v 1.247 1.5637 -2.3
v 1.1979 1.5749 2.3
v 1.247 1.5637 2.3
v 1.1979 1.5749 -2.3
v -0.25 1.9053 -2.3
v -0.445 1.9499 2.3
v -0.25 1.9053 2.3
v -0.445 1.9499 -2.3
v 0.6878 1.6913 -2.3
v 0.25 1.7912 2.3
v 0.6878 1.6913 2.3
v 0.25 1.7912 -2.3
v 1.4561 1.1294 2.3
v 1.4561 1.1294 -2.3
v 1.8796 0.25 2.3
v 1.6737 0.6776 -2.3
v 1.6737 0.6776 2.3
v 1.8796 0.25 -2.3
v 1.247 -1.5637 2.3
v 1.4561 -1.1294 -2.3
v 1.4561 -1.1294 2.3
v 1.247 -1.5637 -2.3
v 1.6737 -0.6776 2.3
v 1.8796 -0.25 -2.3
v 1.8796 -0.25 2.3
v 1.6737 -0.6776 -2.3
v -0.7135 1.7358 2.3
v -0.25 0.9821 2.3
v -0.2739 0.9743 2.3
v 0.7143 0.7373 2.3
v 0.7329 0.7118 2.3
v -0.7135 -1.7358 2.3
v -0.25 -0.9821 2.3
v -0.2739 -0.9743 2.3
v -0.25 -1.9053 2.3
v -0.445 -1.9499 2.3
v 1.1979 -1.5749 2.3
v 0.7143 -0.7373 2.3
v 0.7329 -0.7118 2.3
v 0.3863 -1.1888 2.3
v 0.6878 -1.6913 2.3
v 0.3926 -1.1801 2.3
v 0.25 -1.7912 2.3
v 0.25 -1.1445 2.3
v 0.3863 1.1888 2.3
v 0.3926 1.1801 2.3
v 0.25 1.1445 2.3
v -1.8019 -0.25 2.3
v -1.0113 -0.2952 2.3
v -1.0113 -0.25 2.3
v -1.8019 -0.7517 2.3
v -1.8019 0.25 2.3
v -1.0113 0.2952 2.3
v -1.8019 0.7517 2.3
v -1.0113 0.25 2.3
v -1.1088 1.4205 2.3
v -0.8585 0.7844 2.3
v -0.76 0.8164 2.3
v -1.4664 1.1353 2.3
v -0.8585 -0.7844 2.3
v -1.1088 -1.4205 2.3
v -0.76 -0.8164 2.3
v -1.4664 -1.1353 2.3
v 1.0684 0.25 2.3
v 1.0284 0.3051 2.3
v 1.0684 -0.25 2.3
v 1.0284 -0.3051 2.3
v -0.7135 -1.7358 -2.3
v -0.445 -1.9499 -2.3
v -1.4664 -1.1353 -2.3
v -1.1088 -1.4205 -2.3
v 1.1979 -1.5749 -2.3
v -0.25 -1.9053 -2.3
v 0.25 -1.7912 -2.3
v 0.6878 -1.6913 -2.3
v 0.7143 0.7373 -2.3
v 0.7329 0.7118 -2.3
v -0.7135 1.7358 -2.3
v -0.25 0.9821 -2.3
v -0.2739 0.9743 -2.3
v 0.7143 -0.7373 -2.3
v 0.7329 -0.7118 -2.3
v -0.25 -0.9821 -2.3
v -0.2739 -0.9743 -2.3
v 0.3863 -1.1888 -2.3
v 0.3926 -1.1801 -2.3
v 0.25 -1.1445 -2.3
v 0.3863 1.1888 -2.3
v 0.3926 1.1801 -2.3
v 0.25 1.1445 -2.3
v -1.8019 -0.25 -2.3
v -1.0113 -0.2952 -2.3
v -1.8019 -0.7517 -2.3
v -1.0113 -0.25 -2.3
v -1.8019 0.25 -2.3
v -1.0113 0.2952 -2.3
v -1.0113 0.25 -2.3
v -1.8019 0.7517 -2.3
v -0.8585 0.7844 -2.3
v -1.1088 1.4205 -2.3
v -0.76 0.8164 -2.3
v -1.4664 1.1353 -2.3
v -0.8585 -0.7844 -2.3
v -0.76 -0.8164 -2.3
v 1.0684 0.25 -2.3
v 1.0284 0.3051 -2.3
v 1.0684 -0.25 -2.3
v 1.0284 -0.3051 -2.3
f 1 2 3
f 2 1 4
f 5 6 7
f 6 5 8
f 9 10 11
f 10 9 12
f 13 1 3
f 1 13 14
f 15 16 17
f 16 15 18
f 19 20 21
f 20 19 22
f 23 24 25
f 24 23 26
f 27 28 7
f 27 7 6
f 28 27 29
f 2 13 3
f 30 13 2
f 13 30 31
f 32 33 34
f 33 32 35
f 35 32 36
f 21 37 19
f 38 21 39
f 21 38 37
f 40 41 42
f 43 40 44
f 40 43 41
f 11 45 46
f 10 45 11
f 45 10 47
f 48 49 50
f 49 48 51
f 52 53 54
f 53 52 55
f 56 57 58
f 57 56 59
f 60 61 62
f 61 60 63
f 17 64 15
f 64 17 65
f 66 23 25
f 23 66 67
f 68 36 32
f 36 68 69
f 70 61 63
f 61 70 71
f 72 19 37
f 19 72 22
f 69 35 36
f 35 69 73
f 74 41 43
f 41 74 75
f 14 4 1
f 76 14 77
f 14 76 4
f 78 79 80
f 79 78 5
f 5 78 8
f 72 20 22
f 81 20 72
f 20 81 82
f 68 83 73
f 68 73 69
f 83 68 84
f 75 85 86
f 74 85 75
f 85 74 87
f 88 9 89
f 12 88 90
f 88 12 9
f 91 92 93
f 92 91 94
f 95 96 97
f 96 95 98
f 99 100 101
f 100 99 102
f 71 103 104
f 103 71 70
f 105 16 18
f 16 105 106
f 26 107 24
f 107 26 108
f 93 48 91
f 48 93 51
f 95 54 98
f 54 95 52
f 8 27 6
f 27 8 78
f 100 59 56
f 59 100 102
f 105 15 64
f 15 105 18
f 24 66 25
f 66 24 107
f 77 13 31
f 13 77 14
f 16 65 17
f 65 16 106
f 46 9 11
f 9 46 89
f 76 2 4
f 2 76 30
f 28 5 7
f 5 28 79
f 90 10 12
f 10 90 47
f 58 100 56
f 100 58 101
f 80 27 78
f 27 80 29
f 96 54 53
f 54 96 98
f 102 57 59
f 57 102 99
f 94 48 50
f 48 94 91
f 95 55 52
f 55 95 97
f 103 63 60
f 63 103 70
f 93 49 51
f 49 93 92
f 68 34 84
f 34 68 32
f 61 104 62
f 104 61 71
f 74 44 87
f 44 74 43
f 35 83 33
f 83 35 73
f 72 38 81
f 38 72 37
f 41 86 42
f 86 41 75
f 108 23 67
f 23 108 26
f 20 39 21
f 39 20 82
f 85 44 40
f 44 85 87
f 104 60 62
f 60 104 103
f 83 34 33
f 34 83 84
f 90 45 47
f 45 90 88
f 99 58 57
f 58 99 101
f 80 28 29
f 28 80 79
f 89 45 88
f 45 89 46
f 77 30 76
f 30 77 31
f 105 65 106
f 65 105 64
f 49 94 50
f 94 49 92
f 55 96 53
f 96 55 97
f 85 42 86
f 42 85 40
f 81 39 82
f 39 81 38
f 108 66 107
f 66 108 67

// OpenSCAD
// Parameters
outer_diameter_mm = 4.0; //[2.0:8.0:0.1]
length_mm = 4.6; //[2.3:9.2:0.1]
screw_nominal_diameter_mm = 2.5; //[1.2:5.0:0.1]
internal_hole_diameter_mm = 2.5; //[1.2:4.0:0.05]
internal_thread_pitch_mm = 0.45; //[0.2:1.0:0.01]
top_chamfer_height_mm = 0.4; //[0.2:1.0:0.05]
bottom_chamfer_height_mm = 0.4; //[0.2:1.0:0.05]
knurl_depth_mm = 0.25; //[0.1:0.6:0.01]
knurl_pitch_mm = 0.8; //[0.4:1.6:0.05]
knurl_count = 12; //[6:24:1]
knurl_groove_width_mm = 0.5; //[0.2:1.2:0.05]
knurl_band_height_mm = 3.2; //[1.6:6.4:0.1]
knurl_band_center_offset_mm = 0.0; //[-1.0:1.0:0.1]
overlap_mm = 0.8; //[0.5:2.0:0.1]

// Threaded Insert - complete geometry
module threaded_insert() {
  color([0.8, 0.6, 0.2]) { // Brass color
    difference() {
      // Main body with chamfers
      union() {
        // Main cylindrical body
        cylinder(r=outer_diameter_mm/2, h=length_mm, center=true);
        
        // Top chamfer
        translate([0, 0, length_mm/2 - top_chamfer_height_mm/2])
          rotate([180, 0, 0])
          cylinder(r1=outer_diameter_mm/2, r2=0, h=top_chamfer_height_mm, center=true);
        
        // Bottom chamfer
        translate([0, 0, -length_mm/2 + bottom_chamfer_height_mm/2])
          cylinder(r1=outer_diameter_mm/2, r2=0, h=bottom_chamfer_height_mm, center=true);
      }
      
      // Internal clearance bore
      cylinder(r=internal_hole_diameter_mm/2, h=length_mm + 2*overlap_mm, center=true);
      
      // Knurl grooves
      for (i = [0:knurl_count-1]) {
        rotate([0, 0, i*360/knurl_count])
          translate([outer_diameter_mm/2 - (knurl_depth_mm + overlap_mm)/2, 0, knurl_band_center_offset_mm])
          cube([knurl_depth_mm + overlap_mm, knurl_groove_width_mm, knurl_band_height_mm + 2*overlap_mm], center=true);
      }
    }
  }
}

// Assembly
module assembly() {
  threaded_insert();
}

assembly();
